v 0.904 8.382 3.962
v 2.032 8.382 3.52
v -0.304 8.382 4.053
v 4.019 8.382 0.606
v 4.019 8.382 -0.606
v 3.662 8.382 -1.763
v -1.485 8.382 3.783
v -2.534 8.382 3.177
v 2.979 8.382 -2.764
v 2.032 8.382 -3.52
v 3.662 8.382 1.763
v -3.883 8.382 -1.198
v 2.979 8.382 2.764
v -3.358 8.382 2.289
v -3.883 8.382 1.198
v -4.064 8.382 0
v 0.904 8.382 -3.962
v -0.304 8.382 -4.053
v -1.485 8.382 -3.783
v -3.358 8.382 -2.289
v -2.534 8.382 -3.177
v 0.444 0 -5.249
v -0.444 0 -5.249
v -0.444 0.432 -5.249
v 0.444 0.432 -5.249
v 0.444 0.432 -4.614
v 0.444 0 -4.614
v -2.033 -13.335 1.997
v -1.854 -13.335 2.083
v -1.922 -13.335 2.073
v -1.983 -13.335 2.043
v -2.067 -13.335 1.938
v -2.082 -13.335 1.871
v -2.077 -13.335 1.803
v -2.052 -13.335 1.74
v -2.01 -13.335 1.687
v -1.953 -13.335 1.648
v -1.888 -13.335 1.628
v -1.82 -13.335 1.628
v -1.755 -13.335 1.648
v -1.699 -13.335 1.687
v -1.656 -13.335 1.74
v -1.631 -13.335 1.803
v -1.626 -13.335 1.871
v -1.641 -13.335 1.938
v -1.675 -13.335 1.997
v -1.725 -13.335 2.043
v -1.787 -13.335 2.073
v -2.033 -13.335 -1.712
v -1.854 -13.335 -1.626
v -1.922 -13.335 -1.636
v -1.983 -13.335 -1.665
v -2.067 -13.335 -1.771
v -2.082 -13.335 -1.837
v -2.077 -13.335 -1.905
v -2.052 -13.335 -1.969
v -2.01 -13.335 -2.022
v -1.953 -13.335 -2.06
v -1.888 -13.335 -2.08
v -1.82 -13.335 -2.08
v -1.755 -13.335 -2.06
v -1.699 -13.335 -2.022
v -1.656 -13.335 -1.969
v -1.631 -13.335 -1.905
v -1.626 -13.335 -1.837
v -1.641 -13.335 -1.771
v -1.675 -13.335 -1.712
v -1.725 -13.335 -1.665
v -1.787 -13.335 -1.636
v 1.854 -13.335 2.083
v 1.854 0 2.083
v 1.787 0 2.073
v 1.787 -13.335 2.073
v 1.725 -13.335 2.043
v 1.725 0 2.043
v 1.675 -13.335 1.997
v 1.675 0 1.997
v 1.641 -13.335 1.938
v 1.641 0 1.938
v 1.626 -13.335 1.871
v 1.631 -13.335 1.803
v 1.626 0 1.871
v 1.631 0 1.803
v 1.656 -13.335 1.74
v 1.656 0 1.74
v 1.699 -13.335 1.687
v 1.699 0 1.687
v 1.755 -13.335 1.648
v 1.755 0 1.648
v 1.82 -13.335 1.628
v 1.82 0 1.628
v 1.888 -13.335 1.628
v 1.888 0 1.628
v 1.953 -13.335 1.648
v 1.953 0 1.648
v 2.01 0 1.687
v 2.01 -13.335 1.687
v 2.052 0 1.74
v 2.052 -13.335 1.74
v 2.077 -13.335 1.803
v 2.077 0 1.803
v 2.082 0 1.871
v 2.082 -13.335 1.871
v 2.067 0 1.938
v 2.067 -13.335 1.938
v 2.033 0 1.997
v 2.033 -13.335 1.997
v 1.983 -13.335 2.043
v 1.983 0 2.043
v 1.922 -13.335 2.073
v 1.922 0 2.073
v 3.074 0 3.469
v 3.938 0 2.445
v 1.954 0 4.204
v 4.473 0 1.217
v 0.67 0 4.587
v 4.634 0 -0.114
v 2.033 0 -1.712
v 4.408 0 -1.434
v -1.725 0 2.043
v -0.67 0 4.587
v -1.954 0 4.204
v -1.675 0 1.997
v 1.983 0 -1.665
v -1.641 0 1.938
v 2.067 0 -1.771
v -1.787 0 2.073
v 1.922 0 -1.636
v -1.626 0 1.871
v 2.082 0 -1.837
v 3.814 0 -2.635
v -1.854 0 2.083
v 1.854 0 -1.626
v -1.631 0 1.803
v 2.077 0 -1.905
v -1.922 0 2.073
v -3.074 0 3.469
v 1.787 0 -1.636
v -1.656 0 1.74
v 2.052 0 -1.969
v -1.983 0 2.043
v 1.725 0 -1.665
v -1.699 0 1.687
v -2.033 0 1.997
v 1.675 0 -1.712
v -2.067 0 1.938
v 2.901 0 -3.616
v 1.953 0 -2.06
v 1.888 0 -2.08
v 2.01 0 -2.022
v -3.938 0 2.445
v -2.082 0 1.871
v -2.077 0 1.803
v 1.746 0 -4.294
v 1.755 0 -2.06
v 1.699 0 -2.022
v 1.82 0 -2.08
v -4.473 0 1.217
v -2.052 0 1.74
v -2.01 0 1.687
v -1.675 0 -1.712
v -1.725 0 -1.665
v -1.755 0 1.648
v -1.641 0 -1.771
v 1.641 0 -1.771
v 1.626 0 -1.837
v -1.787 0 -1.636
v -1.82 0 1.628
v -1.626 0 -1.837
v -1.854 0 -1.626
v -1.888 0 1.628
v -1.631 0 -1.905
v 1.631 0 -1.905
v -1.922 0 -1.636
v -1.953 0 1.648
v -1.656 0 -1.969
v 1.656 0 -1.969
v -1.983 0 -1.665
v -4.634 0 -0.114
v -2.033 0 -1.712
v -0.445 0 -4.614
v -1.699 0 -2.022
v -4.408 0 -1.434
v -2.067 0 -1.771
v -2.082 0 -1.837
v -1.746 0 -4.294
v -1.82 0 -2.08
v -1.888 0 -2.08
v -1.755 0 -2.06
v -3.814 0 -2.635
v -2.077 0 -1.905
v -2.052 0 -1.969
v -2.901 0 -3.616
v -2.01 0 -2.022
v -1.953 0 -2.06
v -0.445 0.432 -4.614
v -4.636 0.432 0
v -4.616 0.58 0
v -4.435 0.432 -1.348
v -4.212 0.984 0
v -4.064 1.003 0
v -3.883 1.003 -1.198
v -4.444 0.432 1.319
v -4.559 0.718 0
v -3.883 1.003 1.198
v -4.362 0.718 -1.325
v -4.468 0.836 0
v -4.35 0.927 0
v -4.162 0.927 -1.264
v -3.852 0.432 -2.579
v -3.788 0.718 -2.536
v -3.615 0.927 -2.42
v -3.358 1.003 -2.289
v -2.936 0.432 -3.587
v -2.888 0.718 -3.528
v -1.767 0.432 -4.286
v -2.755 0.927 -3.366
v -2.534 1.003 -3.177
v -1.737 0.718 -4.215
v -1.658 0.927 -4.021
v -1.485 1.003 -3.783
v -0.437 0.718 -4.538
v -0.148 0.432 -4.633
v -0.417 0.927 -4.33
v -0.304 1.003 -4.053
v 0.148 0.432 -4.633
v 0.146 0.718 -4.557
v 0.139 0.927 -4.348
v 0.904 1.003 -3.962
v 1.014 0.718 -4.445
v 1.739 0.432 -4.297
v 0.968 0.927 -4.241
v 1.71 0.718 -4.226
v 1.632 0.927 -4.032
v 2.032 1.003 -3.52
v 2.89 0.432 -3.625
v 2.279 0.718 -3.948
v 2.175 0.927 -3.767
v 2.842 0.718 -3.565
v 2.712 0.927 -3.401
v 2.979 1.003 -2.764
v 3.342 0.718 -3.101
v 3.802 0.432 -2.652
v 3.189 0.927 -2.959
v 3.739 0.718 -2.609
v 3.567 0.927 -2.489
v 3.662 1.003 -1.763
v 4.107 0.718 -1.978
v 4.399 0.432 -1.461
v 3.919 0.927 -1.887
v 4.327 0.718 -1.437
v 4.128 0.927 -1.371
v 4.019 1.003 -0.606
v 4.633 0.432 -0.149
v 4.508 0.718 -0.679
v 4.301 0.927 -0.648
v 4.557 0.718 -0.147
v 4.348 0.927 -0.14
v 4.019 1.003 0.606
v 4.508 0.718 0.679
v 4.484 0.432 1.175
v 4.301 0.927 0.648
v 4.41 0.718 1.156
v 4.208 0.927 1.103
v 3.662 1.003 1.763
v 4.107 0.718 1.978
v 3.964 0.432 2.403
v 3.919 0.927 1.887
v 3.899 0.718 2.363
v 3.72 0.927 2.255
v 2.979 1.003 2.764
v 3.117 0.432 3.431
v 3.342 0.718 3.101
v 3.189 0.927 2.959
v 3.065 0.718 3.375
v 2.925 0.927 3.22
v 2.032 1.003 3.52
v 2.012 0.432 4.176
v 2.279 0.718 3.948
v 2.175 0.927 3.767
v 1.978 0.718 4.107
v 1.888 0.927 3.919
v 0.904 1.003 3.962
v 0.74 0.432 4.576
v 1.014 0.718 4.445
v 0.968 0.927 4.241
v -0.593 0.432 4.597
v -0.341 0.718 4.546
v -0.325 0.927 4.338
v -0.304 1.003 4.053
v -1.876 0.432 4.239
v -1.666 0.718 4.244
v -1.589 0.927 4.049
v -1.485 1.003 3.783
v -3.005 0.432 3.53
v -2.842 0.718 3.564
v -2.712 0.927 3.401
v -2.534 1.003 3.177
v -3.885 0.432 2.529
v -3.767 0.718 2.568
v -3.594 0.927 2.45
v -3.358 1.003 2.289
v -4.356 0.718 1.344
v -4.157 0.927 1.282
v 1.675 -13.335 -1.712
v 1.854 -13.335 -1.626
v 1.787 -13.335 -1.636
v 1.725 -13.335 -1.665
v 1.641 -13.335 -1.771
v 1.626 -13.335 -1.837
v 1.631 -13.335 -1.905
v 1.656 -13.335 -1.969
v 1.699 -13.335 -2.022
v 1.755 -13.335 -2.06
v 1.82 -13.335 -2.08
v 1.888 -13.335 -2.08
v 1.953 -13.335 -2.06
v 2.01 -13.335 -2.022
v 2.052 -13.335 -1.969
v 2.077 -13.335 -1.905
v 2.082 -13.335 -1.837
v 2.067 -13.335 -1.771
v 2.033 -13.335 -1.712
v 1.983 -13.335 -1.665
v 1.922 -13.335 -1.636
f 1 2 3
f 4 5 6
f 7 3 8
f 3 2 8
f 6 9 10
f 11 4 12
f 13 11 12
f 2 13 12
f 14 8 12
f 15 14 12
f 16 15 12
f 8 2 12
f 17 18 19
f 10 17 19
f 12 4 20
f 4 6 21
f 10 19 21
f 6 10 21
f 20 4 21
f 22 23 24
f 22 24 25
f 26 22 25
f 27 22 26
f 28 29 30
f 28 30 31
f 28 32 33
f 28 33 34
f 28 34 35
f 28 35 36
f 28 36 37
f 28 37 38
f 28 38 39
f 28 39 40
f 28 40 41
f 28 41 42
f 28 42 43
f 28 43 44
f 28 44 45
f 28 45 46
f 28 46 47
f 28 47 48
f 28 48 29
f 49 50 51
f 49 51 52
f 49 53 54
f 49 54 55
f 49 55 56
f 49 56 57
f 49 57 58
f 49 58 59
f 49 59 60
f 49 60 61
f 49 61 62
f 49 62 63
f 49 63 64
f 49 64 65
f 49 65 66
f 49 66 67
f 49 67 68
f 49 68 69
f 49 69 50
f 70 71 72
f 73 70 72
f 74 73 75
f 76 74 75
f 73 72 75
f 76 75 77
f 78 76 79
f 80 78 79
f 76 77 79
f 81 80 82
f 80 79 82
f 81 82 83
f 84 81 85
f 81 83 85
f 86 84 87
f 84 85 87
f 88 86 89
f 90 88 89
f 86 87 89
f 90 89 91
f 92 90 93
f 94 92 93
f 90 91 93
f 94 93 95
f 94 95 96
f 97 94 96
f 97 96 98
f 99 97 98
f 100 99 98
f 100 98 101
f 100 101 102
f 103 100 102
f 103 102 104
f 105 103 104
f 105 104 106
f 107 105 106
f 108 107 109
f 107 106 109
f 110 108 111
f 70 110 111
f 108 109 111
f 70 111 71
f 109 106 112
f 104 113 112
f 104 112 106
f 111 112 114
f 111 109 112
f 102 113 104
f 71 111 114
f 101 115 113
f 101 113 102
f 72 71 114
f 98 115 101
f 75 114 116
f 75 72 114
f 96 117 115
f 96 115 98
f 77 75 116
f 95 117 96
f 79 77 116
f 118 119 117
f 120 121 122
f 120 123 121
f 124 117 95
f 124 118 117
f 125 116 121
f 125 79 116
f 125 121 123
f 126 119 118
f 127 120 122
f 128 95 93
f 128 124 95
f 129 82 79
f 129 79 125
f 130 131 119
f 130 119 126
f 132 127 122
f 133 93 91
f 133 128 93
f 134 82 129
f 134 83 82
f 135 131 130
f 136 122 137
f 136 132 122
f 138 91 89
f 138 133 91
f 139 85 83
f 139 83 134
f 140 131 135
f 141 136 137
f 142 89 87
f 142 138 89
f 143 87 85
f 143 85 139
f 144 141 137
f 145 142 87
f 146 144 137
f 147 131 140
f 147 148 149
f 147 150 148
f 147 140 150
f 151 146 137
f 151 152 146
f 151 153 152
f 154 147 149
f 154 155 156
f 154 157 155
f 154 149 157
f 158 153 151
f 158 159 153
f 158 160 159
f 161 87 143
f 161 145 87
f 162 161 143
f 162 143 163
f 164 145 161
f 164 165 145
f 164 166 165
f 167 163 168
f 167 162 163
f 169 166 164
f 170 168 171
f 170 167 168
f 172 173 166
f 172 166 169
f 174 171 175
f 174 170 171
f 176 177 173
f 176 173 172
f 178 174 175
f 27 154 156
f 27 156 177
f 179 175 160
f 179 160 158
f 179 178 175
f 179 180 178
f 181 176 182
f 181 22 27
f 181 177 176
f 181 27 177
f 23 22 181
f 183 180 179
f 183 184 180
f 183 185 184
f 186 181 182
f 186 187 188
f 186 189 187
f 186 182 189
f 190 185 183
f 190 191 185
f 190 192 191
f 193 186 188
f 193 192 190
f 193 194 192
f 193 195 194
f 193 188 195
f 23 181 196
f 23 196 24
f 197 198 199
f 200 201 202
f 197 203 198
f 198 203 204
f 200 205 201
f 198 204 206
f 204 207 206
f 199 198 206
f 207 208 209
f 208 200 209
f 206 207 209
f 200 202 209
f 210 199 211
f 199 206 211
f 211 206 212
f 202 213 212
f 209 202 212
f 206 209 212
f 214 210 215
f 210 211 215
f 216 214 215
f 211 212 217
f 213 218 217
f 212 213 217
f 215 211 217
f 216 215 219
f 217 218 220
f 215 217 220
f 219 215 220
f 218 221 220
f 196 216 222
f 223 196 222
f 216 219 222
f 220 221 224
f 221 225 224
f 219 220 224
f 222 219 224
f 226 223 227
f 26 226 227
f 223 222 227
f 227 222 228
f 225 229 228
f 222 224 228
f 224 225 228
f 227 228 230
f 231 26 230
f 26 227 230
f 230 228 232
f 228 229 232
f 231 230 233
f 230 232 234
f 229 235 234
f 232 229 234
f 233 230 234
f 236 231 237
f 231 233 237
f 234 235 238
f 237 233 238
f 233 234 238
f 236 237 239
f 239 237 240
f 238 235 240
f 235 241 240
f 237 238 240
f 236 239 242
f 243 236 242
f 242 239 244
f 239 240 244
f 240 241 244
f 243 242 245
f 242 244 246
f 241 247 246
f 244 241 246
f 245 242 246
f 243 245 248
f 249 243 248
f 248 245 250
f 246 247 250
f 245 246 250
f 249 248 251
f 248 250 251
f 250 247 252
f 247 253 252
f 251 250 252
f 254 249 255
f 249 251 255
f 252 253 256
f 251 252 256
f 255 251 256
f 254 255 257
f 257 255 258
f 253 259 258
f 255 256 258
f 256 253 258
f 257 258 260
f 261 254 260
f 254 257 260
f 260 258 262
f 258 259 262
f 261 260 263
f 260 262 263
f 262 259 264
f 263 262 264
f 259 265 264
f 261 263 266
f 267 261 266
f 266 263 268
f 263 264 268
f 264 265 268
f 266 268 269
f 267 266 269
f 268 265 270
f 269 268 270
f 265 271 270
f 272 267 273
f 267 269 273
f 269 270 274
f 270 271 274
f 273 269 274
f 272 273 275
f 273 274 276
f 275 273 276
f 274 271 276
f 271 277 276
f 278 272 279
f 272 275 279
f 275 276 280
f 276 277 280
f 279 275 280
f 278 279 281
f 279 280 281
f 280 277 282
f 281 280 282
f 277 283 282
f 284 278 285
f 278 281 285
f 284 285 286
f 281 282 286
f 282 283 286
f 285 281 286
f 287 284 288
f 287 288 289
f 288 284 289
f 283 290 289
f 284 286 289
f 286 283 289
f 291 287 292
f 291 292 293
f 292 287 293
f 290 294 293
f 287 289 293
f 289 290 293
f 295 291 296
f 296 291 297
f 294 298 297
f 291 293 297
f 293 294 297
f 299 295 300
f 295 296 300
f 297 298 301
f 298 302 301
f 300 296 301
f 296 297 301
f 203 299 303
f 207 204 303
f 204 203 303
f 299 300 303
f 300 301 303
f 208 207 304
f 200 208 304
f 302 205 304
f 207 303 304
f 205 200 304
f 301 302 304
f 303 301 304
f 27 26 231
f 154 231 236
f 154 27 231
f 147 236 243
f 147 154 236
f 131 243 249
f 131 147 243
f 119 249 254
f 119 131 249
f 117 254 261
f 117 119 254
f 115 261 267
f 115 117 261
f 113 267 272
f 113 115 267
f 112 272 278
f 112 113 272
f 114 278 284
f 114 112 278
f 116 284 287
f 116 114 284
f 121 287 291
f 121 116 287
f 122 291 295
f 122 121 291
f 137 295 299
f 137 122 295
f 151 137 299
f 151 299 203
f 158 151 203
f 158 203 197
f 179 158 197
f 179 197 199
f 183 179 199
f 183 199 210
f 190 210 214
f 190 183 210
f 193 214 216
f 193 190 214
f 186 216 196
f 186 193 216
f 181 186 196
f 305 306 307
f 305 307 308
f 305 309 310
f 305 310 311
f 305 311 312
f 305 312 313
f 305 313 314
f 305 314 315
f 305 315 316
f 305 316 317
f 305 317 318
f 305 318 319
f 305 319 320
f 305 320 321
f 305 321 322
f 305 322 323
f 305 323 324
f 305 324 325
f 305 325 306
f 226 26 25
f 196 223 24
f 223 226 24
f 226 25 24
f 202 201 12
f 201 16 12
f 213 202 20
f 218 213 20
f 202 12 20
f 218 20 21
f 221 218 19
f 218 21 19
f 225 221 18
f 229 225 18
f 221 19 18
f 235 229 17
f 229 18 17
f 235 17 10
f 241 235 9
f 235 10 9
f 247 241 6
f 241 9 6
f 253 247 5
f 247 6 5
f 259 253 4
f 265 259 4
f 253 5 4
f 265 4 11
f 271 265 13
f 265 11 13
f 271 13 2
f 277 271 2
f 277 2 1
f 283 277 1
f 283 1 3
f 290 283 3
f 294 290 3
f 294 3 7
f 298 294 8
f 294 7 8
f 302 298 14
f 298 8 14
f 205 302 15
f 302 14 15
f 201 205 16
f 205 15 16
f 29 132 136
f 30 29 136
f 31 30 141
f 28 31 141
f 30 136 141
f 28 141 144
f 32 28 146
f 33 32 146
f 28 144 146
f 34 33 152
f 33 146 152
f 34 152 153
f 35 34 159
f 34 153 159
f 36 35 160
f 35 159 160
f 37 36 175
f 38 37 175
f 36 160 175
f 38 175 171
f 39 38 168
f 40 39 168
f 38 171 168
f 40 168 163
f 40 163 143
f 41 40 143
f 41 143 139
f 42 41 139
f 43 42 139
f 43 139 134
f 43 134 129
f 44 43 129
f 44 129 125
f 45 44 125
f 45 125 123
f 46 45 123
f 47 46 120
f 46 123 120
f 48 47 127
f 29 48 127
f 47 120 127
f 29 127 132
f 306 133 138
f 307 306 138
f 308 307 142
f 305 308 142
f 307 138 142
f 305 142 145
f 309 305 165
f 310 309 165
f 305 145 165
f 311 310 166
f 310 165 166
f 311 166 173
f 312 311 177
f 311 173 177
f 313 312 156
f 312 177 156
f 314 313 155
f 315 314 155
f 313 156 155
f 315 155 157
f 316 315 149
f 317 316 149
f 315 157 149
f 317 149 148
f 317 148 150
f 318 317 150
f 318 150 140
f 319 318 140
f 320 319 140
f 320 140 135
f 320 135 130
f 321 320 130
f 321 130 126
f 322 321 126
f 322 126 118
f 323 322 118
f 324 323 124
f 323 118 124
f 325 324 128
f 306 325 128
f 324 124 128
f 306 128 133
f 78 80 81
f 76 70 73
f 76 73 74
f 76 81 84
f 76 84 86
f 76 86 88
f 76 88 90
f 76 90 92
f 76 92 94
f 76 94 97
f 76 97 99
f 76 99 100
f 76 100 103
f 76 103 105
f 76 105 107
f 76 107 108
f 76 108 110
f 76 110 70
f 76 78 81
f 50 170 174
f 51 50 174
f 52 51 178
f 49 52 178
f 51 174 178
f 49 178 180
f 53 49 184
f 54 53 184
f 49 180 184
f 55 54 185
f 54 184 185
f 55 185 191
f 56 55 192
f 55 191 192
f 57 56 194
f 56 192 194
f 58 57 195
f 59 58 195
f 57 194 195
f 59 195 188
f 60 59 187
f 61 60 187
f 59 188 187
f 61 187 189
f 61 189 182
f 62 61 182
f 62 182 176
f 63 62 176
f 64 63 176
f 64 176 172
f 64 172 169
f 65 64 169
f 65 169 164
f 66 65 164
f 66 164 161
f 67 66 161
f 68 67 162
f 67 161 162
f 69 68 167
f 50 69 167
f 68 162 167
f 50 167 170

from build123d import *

# Parameters (mm, degrees)
BOSS_EXTRUDE1_DEPTH = 0.4318
SKETCH5_R           = 0.2286
BOSS_EXTRUDE2_DEPTH = 13.335


with BuildPart() as part:
    # Sketch2 → Boss-Extrude1 (new body)
    with BuildSketch(Plane(origin=(0, 0, 0), x_dir=(1, 0, 0), z_dir=(0, 1, 0))):
        with BuildLine():
            Line((-0.4445, 4.61413914), (-0.4445, 5.24913914))
            Line((-0.4445, 5.24913914), (0.4445, 5.24913914))
            Line((0.4445, 5.24913914), (0.4445, 4.61413914))
            ThreePointArc((0.4445, 4.61413914), (0, -4.6355), (-0.4445, 4.61413914))
        make_face()
    extrude(amount=BOSS_EXTRUDE1_DEPTH)

    # Sketch4 → Revolve1 (revolve)
    with BuildSketch(Plane.XY, mode=Mode.PRIVATE) as revolve1_sk:
        with BuildLine():
            Line((4.064, 1.0033), (4.064, 8.382))
            Line((4.064, 8.382), (0, 8.382))
            Line((0, 8.382), (0, 0.4318))
            Line((0, 0.4318), (4.6355, 0.4318))
            ThreePointArc((4.6355, 0.4318), (4.468111525, 0.835911525), (4.064, 1.0033))
        make_face()
    revolve(revolve1_sk.sketch.rotate(Axis((0, 8.382, 0), (0, -1, 0)), 180), axis=Axis((0, 8.382, 0), (0, -1, 0)))

    # Sketch5 → Boss-Extrude2 (add)
    with BuildSketch(Plane.XZ):
        with Locations(Location((-1.8542, -1.8542, 0), (0, 0, 90))):
            Circle(SKETCH5_R)
        with Locations(Location((1.8542, -1.8542, 0), (0, 0, 90))):
            Circle(SKETCH5_R)
        with Locations(Location((1.8542, 1.8542, 0), (0, 0, 90))):
            Circle(SKETCH5_R)
        with Locations(Location((-1.8542, 1.8542, 0), (0, 0, 90))):
            Circle(SKETCH5_R)
    extrude(amount=BOSS_EXTRUDE2_DEPTH)


solid = part.part
